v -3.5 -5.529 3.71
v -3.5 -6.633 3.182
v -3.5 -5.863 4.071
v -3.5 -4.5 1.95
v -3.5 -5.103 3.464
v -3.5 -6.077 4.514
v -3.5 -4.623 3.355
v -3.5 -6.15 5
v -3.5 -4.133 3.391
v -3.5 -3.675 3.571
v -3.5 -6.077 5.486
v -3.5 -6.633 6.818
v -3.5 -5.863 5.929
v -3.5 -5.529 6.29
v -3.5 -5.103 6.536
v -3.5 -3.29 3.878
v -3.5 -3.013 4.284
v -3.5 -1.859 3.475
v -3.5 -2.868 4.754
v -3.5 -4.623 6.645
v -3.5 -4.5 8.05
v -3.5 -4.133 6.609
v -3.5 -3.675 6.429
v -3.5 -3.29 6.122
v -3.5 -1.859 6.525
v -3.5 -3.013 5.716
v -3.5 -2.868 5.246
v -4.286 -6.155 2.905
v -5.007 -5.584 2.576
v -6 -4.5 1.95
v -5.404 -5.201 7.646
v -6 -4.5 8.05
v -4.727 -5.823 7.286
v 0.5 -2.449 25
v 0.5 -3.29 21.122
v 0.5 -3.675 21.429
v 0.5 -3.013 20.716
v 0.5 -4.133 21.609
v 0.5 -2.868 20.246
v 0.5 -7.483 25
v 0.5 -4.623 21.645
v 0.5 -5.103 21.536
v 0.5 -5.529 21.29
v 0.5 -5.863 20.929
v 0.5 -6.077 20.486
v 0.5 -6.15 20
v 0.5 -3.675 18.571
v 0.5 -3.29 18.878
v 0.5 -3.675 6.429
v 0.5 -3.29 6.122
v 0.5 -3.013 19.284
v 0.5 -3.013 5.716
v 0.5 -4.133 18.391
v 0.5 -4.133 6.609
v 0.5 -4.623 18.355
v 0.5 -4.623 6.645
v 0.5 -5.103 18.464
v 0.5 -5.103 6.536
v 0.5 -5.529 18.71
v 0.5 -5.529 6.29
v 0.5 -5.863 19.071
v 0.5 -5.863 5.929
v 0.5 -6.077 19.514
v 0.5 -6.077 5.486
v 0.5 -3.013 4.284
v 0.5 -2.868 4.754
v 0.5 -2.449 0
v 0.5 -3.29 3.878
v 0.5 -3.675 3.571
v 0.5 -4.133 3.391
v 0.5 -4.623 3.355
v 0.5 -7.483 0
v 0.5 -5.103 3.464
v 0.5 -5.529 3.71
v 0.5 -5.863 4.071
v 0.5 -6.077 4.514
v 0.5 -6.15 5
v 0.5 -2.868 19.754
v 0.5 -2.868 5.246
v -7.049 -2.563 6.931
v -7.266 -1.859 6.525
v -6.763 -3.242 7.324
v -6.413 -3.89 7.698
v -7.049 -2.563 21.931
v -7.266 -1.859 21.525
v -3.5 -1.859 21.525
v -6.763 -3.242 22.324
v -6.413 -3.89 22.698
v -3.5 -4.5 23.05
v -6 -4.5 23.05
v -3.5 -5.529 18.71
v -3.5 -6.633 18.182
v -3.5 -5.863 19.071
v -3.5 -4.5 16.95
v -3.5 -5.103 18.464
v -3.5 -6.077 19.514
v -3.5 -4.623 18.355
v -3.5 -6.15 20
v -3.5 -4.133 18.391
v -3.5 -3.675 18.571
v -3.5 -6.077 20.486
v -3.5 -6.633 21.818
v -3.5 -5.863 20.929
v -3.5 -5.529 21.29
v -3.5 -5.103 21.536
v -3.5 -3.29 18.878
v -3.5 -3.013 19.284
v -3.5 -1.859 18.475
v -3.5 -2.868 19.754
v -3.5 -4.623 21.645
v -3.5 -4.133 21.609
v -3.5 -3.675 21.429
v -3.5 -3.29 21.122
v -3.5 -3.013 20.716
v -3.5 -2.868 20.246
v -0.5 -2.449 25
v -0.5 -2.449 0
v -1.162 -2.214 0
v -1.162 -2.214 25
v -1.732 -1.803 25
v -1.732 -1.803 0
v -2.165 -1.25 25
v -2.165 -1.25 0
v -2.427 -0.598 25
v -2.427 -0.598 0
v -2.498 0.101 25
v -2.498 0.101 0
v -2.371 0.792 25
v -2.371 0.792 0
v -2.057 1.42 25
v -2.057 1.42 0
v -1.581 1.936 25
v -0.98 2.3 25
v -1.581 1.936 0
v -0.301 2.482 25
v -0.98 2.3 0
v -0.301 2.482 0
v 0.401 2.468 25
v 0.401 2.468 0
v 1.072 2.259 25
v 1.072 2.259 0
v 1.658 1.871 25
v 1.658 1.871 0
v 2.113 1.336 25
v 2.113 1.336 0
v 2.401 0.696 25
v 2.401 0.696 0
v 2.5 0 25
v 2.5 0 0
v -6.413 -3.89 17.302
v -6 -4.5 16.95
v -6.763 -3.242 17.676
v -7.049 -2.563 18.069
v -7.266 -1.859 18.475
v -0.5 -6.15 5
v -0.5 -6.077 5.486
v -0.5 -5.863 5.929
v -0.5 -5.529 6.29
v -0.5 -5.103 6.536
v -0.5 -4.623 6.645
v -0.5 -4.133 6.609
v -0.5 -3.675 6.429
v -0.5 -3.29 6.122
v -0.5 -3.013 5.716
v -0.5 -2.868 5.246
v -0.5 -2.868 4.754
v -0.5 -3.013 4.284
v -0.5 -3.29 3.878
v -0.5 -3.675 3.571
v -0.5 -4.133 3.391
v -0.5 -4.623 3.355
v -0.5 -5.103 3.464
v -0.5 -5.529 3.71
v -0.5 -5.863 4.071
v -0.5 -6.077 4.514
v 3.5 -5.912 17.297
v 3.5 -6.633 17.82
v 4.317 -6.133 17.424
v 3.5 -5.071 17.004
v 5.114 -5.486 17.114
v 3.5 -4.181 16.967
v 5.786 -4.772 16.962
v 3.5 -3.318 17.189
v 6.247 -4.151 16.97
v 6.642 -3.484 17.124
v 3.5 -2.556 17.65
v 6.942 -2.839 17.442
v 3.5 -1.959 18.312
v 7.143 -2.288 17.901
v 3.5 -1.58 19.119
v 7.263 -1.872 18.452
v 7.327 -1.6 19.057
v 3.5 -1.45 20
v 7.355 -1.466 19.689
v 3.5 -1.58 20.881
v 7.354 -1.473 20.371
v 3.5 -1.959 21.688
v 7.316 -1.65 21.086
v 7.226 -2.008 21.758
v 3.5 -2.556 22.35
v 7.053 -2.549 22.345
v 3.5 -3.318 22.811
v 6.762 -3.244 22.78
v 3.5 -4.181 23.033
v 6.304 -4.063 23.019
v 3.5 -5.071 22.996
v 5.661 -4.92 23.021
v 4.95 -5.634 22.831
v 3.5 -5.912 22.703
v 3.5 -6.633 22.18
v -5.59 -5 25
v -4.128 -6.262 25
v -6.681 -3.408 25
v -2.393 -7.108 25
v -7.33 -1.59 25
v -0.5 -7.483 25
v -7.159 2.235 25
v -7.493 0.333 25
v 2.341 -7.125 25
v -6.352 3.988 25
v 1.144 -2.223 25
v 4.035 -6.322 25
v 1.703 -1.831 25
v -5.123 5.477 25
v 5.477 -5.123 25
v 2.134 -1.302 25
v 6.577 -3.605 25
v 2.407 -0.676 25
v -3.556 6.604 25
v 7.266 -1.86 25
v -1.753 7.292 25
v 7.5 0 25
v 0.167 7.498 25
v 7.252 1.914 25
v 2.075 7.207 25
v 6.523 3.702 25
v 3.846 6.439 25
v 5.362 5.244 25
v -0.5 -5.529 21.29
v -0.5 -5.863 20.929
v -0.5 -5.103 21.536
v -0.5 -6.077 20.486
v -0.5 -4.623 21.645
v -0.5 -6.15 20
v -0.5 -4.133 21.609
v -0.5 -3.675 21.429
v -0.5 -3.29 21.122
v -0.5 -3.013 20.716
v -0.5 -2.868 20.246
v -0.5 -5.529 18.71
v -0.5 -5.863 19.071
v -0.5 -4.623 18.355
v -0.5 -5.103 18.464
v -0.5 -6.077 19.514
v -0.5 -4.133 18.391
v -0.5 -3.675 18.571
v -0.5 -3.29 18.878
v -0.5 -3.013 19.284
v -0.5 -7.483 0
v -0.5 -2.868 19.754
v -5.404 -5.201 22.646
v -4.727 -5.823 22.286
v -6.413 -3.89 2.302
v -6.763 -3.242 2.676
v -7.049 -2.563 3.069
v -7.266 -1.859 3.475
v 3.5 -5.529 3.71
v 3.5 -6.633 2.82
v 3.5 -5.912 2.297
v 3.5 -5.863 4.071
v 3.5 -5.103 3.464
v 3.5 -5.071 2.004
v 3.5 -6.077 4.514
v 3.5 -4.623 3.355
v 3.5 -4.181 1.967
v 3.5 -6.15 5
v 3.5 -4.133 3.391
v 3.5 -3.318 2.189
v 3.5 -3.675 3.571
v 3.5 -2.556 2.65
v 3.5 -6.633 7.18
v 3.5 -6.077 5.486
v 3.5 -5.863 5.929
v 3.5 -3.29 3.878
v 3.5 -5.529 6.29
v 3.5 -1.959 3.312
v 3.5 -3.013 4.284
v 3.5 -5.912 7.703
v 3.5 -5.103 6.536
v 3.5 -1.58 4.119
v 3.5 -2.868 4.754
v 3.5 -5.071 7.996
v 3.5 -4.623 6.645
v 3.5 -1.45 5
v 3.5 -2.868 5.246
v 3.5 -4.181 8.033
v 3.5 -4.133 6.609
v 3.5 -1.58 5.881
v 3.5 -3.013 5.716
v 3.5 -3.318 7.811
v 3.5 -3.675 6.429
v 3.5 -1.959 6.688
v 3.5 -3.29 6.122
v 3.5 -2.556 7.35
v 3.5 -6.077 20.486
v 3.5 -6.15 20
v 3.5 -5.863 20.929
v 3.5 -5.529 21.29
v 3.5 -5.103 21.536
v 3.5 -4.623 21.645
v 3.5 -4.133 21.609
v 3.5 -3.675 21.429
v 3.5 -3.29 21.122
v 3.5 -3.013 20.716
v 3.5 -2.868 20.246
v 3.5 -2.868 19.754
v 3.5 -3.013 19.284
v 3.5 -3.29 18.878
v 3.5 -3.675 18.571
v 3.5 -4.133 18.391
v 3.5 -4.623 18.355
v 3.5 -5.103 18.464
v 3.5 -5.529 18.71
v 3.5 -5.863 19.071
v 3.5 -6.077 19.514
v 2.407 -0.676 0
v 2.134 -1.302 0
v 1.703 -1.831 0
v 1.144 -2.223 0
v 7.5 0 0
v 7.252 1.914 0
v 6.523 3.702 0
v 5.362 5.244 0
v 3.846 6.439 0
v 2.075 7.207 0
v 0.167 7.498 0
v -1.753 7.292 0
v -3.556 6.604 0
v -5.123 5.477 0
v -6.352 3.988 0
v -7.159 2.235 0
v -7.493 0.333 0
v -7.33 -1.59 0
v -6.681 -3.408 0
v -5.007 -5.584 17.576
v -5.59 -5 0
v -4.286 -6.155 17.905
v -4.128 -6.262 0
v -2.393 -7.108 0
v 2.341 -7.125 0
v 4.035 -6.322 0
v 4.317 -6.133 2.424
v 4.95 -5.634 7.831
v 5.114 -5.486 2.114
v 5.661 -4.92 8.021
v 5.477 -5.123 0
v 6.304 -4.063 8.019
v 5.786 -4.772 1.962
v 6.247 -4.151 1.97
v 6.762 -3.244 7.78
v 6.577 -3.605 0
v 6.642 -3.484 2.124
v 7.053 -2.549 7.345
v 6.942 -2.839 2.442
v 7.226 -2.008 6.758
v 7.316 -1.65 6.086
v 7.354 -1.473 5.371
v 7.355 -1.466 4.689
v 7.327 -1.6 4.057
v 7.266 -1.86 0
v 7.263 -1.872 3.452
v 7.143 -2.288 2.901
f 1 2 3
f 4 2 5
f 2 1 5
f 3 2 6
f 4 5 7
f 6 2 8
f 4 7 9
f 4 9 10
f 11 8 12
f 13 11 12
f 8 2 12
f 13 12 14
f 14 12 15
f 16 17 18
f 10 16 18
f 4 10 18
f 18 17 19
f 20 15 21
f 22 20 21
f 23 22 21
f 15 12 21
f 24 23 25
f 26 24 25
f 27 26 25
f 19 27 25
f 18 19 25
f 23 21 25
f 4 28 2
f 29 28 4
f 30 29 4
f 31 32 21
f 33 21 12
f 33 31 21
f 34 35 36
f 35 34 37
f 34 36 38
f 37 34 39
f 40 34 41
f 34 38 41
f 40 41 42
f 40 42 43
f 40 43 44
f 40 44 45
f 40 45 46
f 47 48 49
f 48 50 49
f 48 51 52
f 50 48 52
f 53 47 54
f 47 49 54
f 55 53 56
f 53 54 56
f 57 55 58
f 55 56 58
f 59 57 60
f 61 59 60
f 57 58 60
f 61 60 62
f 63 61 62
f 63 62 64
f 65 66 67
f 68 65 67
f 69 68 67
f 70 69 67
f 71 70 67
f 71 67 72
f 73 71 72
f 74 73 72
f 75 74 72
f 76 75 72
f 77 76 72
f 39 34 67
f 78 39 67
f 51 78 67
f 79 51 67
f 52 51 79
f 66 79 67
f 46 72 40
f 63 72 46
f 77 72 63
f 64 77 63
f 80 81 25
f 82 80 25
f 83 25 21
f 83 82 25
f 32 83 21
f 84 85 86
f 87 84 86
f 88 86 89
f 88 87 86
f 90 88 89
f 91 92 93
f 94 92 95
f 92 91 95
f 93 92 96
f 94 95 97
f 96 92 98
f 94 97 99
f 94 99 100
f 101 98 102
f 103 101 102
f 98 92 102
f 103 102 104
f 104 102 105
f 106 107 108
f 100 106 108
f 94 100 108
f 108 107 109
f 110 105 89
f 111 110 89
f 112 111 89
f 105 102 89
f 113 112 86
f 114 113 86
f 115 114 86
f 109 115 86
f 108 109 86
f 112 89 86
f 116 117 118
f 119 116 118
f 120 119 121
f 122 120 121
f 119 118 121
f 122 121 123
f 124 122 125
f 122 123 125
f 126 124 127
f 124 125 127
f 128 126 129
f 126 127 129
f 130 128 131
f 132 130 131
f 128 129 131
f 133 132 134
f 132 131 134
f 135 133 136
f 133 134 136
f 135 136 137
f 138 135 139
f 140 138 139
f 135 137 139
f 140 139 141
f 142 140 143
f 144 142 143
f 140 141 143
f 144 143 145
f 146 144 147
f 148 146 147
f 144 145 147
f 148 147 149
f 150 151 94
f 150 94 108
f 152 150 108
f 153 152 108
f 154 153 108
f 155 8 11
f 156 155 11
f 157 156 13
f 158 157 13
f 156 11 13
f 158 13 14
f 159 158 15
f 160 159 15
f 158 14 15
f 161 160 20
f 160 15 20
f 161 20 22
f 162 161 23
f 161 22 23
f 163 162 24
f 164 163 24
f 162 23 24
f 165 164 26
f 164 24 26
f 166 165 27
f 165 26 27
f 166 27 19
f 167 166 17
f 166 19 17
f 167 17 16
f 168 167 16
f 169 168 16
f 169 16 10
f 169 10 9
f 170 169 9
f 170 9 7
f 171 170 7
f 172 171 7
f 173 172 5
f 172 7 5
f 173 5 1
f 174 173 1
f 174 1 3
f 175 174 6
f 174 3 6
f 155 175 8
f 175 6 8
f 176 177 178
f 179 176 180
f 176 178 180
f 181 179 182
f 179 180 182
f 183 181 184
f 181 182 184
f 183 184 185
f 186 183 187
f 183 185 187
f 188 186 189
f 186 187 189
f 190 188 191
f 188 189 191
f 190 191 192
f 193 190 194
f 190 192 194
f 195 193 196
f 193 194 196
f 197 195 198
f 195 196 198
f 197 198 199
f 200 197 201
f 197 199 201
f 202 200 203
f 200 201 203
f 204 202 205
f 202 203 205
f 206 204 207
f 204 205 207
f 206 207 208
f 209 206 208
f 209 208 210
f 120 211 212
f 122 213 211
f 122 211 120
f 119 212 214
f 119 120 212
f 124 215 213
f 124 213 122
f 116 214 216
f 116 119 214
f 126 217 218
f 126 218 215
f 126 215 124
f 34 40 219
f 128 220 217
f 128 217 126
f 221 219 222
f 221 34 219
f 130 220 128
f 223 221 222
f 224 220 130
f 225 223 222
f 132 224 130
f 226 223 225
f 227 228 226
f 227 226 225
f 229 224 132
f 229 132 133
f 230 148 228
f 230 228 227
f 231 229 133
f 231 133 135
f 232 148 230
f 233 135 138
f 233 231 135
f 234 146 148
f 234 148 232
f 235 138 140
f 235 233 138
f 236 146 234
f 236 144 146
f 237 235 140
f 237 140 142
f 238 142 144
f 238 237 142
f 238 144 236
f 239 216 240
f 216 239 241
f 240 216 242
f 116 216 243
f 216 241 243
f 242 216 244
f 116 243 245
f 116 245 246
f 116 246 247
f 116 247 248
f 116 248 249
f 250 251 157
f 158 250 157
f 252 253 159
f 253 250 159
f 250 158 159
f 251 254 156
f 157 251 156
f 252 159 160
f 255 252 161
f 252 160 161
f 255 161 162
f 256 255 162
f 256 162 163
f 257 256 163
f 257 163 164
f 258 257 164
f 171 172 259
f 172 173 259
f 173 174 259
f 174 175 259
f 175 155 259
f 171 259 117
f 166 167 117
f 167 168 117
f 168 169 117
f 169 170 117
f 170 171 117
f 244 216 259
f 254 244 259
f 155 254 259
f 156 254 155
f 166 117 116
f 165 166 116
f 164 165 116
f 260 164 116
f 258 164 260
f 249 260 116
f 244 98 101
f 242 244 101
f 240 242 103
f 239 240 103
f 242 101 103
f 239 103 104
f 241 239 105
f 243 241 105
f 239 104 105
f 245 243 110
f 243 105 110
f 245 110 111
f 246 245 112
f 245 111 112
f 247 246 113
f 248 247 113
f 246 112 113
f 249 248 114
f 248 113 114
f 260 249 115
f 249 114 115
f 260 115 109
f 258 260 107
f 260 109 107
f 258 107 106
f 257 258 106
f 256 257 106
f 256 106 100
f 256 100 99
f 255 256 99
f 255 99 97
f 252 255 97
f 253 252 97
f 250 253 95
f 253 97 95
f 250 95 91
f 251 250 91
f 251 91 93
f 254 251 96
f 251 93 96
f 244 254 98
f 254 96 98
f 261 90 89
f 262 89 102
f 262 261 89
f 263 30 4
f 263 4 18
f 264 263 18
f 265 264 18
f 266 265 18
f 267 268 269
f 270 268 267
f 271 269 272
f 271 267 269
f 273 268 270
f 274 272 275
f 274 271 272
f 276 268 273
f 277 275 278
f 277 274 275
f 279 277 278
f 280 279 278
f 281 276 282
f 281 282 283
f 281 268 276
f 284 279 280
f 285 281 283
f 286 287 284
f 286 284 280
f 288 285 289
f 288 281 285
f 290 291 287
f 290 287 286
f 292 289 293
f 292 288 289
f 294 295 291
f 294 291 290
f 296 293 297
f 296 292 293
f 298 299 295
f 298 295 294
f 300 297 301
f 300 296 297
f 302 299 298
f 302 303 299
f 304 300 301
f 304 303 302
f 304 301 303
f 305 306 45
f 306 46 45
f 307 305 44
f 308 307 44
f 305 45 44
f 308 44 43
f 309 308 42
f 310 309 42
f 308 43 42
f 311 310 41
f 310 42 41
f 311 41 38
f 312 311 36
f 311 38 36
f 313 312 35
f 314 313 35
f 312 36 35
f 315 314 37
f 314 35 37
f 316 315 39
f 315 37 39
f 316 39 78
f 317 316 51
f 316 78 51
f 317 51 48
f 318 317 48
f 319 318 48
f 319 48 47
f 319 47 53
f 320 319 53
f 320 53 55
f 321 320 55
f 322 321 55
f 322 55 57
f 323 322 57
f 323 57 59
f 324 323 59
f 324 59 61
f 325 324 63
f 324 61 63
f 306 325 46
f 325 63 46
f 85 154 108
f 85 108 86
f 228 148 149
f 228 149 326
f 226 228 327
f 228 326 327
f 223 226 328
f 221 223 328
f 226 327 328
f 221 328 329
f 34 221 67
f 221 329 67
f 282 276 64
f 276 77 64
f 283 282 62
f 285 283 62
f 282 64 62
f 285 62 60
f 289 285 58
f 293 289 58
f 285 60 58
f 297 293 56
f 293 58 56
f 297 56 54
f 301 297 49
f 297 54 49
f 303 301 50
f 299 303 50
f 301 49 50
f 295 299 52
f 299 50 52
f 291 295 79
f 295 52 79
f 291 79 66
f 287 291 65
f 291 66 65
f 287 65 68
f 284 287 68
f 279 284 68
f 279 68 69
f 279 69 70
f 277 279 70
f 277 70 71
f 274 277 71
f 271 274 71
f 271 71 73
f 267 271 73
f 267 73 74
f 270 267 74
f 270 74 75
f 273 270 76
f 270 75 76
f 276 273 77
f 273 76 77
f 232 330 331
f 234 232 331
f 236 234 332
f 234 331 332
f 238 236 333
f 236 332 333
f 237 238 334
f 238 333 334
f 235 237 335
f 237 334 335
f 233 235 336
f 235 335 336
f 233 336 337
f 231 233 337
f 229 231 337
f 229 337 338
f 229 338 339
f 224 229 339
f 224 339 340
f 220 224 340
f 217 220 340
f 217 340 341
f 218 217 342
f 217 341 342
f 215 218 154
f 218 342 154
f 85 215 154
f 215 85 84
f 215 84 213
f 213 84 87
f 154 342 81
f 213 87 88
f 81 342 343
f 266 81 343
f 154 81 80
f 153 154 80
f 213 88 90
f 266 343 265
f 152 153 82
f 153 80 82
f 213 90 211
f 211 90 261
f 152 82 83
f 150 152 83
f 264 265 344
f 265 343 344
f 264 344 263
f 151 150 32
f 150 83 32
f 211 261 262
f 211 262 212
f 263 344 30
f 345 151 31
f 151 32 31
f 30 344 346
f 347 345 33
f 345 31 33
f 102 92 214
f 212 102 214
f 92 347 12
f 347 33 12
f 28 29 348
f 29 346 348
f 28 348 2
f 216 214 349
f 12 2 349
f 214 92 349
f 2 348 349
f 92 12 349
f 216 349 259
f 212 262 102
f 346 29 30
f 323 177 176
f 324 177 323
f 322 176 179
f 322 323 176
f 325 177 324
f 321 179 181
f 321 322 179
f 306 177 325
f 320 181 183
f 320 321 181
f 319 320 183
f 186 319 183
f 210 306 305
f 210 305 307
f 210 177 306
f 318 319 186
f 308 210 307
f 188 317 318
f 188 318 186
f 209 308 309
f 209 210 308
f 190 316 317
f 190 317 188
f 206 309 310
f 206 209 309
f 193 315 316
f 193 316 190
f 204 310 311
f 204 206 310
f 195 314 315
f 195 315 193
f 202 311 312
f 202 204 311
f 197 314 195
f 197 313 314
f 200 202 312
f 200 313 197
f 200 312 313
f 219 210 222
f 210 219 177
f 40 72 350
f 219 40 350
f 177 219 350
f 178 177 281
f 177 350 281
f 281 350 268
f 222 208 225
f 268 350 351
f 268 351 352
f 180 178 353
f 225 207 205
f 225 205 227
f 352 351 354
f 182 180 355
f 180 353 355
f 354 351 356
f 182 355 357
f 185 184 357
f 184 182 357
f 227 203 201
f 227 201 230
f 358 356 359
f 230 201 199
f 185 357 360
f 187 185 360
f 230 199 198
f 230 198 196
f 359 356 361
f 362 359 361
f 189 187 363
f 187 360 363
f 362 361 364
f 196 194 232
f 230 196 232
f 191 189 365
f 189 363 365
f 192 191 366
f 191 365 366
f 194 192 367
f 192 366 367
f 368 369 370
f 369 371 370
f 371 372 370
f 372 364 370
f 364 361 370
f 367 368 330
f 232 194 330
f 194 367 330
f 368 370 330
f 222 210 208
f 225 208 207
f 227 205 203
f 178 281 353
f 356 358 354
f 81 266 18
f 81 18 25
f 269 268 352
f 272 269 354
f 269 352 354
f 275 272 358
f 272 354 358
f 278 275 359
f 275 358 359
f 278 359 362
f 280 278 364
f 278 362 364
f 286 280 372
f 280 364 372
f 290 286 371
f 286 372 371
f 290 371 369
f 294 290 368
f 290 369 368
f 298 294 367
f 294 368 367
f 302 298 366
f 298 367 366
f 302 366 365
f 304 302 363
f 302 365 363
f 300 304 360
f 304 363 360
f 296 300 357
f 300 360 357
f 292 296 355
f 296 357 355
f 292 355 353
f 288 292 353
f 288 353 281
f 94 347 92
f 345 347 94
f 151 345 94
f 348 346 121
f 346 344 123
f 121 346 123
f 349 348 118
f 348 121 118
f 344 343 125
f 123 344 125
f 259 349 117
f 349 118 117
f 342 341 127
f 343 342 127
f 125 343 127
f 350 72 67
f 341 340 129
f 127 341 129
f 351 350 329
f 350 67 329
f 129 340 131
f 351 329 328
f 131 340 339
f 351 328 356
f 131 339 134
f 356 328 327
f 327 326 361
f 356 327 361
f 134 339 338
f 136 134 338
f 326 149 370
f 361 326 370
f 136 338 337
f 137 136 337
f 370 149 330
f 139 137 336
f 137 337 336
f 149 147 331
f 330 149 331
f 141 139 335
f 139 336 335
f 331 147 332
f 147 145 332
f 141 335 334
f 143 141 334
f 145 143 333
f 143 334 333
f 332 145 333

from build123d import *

# Parameters (mm, degrees)
F1_DEPTH       = 25
F4_D           = 3.3
F4_CBORE_D     = 6.1
F4_CBORE_DEPTH = 4
F3_R           = 1.5
F5_DEPTH       = 3
F6_DEPTH       = 3
F9_DEPTH       = 4


with BuildPart() as f1:
    # F0 (on Top) → F1 (new body)
    with BuildSketch(Plane.XY):
        with BuildLine():
            ThreePointArc((-0.5, -2.44949), (-1.581139, 1.936492), (2.5, 0))
            ThreePointArc((2.5, 0), (1.936492, -1.581139), (0.5, -2.44949))
            Line((0.5, -2.44949), (0.5, -7.483315))
            ThreePointArc((0.5, -7.483315), (5.477226, -5.123475), (7.5, 0))
            ThreePointArc((7.5, 0), (-5.123475, 5.477226), (-0.5, -7.483315))
            Line((-0.5, -7.483315), (-0.5, -2.44949))
        make_face()
    extrude(amount=F1_DEPTH)

    # F4 (through all)
    with Locations(Plane.YZ.offset(7.5)):
        with Locations((-4.5, 20), (-4.5, 5)):
            CounterBoreHole(F4_D / 2, F4_CBORE_D / 2, F4_CBORE_DEPTH)

    # F3 (on plane+point) → F5 (cut)
    with BuildSketch(Plane.YZ.offset(7.5)):
        with Locations((-4.5, 5)):
            Circle(F3_R)
    extrude(amount=-F5_DEPTH, mode=Mode.SUBTRACT)

    # F3 (on plane+point) → F6 (cut)
    with BuildSketch(Plane.YZ.offset(7.5)):
        with Locations((-4.5, 20)):
            Circle(F3_R)
    extrude(amount=-F6_DEPTH, mode=Mode.SUBTRACT)

    # F8 (on plane+point) → F9 (cut)
    with BuildSketch(Plane.YZ.offset(-7.5)):
        Polygon((-7.141377, 3.475), (-4.5, 1.95), (-1.858623, 3.475), (-1.858623, 6.525), (-4.5, 8.05), (-7.141377, 6.525), align=None)
        Polygon((-1.858623, 18.475), (-1.858623, 21.525), (-4.5, 23.05), (-7.141377, 21.525), (-7.141377, 18.475), (-4.5, 16.95), align=None)
    extrude(amount=F9_DEPTH, mode=Mode.SUBTRACT)


solid = f1.part
